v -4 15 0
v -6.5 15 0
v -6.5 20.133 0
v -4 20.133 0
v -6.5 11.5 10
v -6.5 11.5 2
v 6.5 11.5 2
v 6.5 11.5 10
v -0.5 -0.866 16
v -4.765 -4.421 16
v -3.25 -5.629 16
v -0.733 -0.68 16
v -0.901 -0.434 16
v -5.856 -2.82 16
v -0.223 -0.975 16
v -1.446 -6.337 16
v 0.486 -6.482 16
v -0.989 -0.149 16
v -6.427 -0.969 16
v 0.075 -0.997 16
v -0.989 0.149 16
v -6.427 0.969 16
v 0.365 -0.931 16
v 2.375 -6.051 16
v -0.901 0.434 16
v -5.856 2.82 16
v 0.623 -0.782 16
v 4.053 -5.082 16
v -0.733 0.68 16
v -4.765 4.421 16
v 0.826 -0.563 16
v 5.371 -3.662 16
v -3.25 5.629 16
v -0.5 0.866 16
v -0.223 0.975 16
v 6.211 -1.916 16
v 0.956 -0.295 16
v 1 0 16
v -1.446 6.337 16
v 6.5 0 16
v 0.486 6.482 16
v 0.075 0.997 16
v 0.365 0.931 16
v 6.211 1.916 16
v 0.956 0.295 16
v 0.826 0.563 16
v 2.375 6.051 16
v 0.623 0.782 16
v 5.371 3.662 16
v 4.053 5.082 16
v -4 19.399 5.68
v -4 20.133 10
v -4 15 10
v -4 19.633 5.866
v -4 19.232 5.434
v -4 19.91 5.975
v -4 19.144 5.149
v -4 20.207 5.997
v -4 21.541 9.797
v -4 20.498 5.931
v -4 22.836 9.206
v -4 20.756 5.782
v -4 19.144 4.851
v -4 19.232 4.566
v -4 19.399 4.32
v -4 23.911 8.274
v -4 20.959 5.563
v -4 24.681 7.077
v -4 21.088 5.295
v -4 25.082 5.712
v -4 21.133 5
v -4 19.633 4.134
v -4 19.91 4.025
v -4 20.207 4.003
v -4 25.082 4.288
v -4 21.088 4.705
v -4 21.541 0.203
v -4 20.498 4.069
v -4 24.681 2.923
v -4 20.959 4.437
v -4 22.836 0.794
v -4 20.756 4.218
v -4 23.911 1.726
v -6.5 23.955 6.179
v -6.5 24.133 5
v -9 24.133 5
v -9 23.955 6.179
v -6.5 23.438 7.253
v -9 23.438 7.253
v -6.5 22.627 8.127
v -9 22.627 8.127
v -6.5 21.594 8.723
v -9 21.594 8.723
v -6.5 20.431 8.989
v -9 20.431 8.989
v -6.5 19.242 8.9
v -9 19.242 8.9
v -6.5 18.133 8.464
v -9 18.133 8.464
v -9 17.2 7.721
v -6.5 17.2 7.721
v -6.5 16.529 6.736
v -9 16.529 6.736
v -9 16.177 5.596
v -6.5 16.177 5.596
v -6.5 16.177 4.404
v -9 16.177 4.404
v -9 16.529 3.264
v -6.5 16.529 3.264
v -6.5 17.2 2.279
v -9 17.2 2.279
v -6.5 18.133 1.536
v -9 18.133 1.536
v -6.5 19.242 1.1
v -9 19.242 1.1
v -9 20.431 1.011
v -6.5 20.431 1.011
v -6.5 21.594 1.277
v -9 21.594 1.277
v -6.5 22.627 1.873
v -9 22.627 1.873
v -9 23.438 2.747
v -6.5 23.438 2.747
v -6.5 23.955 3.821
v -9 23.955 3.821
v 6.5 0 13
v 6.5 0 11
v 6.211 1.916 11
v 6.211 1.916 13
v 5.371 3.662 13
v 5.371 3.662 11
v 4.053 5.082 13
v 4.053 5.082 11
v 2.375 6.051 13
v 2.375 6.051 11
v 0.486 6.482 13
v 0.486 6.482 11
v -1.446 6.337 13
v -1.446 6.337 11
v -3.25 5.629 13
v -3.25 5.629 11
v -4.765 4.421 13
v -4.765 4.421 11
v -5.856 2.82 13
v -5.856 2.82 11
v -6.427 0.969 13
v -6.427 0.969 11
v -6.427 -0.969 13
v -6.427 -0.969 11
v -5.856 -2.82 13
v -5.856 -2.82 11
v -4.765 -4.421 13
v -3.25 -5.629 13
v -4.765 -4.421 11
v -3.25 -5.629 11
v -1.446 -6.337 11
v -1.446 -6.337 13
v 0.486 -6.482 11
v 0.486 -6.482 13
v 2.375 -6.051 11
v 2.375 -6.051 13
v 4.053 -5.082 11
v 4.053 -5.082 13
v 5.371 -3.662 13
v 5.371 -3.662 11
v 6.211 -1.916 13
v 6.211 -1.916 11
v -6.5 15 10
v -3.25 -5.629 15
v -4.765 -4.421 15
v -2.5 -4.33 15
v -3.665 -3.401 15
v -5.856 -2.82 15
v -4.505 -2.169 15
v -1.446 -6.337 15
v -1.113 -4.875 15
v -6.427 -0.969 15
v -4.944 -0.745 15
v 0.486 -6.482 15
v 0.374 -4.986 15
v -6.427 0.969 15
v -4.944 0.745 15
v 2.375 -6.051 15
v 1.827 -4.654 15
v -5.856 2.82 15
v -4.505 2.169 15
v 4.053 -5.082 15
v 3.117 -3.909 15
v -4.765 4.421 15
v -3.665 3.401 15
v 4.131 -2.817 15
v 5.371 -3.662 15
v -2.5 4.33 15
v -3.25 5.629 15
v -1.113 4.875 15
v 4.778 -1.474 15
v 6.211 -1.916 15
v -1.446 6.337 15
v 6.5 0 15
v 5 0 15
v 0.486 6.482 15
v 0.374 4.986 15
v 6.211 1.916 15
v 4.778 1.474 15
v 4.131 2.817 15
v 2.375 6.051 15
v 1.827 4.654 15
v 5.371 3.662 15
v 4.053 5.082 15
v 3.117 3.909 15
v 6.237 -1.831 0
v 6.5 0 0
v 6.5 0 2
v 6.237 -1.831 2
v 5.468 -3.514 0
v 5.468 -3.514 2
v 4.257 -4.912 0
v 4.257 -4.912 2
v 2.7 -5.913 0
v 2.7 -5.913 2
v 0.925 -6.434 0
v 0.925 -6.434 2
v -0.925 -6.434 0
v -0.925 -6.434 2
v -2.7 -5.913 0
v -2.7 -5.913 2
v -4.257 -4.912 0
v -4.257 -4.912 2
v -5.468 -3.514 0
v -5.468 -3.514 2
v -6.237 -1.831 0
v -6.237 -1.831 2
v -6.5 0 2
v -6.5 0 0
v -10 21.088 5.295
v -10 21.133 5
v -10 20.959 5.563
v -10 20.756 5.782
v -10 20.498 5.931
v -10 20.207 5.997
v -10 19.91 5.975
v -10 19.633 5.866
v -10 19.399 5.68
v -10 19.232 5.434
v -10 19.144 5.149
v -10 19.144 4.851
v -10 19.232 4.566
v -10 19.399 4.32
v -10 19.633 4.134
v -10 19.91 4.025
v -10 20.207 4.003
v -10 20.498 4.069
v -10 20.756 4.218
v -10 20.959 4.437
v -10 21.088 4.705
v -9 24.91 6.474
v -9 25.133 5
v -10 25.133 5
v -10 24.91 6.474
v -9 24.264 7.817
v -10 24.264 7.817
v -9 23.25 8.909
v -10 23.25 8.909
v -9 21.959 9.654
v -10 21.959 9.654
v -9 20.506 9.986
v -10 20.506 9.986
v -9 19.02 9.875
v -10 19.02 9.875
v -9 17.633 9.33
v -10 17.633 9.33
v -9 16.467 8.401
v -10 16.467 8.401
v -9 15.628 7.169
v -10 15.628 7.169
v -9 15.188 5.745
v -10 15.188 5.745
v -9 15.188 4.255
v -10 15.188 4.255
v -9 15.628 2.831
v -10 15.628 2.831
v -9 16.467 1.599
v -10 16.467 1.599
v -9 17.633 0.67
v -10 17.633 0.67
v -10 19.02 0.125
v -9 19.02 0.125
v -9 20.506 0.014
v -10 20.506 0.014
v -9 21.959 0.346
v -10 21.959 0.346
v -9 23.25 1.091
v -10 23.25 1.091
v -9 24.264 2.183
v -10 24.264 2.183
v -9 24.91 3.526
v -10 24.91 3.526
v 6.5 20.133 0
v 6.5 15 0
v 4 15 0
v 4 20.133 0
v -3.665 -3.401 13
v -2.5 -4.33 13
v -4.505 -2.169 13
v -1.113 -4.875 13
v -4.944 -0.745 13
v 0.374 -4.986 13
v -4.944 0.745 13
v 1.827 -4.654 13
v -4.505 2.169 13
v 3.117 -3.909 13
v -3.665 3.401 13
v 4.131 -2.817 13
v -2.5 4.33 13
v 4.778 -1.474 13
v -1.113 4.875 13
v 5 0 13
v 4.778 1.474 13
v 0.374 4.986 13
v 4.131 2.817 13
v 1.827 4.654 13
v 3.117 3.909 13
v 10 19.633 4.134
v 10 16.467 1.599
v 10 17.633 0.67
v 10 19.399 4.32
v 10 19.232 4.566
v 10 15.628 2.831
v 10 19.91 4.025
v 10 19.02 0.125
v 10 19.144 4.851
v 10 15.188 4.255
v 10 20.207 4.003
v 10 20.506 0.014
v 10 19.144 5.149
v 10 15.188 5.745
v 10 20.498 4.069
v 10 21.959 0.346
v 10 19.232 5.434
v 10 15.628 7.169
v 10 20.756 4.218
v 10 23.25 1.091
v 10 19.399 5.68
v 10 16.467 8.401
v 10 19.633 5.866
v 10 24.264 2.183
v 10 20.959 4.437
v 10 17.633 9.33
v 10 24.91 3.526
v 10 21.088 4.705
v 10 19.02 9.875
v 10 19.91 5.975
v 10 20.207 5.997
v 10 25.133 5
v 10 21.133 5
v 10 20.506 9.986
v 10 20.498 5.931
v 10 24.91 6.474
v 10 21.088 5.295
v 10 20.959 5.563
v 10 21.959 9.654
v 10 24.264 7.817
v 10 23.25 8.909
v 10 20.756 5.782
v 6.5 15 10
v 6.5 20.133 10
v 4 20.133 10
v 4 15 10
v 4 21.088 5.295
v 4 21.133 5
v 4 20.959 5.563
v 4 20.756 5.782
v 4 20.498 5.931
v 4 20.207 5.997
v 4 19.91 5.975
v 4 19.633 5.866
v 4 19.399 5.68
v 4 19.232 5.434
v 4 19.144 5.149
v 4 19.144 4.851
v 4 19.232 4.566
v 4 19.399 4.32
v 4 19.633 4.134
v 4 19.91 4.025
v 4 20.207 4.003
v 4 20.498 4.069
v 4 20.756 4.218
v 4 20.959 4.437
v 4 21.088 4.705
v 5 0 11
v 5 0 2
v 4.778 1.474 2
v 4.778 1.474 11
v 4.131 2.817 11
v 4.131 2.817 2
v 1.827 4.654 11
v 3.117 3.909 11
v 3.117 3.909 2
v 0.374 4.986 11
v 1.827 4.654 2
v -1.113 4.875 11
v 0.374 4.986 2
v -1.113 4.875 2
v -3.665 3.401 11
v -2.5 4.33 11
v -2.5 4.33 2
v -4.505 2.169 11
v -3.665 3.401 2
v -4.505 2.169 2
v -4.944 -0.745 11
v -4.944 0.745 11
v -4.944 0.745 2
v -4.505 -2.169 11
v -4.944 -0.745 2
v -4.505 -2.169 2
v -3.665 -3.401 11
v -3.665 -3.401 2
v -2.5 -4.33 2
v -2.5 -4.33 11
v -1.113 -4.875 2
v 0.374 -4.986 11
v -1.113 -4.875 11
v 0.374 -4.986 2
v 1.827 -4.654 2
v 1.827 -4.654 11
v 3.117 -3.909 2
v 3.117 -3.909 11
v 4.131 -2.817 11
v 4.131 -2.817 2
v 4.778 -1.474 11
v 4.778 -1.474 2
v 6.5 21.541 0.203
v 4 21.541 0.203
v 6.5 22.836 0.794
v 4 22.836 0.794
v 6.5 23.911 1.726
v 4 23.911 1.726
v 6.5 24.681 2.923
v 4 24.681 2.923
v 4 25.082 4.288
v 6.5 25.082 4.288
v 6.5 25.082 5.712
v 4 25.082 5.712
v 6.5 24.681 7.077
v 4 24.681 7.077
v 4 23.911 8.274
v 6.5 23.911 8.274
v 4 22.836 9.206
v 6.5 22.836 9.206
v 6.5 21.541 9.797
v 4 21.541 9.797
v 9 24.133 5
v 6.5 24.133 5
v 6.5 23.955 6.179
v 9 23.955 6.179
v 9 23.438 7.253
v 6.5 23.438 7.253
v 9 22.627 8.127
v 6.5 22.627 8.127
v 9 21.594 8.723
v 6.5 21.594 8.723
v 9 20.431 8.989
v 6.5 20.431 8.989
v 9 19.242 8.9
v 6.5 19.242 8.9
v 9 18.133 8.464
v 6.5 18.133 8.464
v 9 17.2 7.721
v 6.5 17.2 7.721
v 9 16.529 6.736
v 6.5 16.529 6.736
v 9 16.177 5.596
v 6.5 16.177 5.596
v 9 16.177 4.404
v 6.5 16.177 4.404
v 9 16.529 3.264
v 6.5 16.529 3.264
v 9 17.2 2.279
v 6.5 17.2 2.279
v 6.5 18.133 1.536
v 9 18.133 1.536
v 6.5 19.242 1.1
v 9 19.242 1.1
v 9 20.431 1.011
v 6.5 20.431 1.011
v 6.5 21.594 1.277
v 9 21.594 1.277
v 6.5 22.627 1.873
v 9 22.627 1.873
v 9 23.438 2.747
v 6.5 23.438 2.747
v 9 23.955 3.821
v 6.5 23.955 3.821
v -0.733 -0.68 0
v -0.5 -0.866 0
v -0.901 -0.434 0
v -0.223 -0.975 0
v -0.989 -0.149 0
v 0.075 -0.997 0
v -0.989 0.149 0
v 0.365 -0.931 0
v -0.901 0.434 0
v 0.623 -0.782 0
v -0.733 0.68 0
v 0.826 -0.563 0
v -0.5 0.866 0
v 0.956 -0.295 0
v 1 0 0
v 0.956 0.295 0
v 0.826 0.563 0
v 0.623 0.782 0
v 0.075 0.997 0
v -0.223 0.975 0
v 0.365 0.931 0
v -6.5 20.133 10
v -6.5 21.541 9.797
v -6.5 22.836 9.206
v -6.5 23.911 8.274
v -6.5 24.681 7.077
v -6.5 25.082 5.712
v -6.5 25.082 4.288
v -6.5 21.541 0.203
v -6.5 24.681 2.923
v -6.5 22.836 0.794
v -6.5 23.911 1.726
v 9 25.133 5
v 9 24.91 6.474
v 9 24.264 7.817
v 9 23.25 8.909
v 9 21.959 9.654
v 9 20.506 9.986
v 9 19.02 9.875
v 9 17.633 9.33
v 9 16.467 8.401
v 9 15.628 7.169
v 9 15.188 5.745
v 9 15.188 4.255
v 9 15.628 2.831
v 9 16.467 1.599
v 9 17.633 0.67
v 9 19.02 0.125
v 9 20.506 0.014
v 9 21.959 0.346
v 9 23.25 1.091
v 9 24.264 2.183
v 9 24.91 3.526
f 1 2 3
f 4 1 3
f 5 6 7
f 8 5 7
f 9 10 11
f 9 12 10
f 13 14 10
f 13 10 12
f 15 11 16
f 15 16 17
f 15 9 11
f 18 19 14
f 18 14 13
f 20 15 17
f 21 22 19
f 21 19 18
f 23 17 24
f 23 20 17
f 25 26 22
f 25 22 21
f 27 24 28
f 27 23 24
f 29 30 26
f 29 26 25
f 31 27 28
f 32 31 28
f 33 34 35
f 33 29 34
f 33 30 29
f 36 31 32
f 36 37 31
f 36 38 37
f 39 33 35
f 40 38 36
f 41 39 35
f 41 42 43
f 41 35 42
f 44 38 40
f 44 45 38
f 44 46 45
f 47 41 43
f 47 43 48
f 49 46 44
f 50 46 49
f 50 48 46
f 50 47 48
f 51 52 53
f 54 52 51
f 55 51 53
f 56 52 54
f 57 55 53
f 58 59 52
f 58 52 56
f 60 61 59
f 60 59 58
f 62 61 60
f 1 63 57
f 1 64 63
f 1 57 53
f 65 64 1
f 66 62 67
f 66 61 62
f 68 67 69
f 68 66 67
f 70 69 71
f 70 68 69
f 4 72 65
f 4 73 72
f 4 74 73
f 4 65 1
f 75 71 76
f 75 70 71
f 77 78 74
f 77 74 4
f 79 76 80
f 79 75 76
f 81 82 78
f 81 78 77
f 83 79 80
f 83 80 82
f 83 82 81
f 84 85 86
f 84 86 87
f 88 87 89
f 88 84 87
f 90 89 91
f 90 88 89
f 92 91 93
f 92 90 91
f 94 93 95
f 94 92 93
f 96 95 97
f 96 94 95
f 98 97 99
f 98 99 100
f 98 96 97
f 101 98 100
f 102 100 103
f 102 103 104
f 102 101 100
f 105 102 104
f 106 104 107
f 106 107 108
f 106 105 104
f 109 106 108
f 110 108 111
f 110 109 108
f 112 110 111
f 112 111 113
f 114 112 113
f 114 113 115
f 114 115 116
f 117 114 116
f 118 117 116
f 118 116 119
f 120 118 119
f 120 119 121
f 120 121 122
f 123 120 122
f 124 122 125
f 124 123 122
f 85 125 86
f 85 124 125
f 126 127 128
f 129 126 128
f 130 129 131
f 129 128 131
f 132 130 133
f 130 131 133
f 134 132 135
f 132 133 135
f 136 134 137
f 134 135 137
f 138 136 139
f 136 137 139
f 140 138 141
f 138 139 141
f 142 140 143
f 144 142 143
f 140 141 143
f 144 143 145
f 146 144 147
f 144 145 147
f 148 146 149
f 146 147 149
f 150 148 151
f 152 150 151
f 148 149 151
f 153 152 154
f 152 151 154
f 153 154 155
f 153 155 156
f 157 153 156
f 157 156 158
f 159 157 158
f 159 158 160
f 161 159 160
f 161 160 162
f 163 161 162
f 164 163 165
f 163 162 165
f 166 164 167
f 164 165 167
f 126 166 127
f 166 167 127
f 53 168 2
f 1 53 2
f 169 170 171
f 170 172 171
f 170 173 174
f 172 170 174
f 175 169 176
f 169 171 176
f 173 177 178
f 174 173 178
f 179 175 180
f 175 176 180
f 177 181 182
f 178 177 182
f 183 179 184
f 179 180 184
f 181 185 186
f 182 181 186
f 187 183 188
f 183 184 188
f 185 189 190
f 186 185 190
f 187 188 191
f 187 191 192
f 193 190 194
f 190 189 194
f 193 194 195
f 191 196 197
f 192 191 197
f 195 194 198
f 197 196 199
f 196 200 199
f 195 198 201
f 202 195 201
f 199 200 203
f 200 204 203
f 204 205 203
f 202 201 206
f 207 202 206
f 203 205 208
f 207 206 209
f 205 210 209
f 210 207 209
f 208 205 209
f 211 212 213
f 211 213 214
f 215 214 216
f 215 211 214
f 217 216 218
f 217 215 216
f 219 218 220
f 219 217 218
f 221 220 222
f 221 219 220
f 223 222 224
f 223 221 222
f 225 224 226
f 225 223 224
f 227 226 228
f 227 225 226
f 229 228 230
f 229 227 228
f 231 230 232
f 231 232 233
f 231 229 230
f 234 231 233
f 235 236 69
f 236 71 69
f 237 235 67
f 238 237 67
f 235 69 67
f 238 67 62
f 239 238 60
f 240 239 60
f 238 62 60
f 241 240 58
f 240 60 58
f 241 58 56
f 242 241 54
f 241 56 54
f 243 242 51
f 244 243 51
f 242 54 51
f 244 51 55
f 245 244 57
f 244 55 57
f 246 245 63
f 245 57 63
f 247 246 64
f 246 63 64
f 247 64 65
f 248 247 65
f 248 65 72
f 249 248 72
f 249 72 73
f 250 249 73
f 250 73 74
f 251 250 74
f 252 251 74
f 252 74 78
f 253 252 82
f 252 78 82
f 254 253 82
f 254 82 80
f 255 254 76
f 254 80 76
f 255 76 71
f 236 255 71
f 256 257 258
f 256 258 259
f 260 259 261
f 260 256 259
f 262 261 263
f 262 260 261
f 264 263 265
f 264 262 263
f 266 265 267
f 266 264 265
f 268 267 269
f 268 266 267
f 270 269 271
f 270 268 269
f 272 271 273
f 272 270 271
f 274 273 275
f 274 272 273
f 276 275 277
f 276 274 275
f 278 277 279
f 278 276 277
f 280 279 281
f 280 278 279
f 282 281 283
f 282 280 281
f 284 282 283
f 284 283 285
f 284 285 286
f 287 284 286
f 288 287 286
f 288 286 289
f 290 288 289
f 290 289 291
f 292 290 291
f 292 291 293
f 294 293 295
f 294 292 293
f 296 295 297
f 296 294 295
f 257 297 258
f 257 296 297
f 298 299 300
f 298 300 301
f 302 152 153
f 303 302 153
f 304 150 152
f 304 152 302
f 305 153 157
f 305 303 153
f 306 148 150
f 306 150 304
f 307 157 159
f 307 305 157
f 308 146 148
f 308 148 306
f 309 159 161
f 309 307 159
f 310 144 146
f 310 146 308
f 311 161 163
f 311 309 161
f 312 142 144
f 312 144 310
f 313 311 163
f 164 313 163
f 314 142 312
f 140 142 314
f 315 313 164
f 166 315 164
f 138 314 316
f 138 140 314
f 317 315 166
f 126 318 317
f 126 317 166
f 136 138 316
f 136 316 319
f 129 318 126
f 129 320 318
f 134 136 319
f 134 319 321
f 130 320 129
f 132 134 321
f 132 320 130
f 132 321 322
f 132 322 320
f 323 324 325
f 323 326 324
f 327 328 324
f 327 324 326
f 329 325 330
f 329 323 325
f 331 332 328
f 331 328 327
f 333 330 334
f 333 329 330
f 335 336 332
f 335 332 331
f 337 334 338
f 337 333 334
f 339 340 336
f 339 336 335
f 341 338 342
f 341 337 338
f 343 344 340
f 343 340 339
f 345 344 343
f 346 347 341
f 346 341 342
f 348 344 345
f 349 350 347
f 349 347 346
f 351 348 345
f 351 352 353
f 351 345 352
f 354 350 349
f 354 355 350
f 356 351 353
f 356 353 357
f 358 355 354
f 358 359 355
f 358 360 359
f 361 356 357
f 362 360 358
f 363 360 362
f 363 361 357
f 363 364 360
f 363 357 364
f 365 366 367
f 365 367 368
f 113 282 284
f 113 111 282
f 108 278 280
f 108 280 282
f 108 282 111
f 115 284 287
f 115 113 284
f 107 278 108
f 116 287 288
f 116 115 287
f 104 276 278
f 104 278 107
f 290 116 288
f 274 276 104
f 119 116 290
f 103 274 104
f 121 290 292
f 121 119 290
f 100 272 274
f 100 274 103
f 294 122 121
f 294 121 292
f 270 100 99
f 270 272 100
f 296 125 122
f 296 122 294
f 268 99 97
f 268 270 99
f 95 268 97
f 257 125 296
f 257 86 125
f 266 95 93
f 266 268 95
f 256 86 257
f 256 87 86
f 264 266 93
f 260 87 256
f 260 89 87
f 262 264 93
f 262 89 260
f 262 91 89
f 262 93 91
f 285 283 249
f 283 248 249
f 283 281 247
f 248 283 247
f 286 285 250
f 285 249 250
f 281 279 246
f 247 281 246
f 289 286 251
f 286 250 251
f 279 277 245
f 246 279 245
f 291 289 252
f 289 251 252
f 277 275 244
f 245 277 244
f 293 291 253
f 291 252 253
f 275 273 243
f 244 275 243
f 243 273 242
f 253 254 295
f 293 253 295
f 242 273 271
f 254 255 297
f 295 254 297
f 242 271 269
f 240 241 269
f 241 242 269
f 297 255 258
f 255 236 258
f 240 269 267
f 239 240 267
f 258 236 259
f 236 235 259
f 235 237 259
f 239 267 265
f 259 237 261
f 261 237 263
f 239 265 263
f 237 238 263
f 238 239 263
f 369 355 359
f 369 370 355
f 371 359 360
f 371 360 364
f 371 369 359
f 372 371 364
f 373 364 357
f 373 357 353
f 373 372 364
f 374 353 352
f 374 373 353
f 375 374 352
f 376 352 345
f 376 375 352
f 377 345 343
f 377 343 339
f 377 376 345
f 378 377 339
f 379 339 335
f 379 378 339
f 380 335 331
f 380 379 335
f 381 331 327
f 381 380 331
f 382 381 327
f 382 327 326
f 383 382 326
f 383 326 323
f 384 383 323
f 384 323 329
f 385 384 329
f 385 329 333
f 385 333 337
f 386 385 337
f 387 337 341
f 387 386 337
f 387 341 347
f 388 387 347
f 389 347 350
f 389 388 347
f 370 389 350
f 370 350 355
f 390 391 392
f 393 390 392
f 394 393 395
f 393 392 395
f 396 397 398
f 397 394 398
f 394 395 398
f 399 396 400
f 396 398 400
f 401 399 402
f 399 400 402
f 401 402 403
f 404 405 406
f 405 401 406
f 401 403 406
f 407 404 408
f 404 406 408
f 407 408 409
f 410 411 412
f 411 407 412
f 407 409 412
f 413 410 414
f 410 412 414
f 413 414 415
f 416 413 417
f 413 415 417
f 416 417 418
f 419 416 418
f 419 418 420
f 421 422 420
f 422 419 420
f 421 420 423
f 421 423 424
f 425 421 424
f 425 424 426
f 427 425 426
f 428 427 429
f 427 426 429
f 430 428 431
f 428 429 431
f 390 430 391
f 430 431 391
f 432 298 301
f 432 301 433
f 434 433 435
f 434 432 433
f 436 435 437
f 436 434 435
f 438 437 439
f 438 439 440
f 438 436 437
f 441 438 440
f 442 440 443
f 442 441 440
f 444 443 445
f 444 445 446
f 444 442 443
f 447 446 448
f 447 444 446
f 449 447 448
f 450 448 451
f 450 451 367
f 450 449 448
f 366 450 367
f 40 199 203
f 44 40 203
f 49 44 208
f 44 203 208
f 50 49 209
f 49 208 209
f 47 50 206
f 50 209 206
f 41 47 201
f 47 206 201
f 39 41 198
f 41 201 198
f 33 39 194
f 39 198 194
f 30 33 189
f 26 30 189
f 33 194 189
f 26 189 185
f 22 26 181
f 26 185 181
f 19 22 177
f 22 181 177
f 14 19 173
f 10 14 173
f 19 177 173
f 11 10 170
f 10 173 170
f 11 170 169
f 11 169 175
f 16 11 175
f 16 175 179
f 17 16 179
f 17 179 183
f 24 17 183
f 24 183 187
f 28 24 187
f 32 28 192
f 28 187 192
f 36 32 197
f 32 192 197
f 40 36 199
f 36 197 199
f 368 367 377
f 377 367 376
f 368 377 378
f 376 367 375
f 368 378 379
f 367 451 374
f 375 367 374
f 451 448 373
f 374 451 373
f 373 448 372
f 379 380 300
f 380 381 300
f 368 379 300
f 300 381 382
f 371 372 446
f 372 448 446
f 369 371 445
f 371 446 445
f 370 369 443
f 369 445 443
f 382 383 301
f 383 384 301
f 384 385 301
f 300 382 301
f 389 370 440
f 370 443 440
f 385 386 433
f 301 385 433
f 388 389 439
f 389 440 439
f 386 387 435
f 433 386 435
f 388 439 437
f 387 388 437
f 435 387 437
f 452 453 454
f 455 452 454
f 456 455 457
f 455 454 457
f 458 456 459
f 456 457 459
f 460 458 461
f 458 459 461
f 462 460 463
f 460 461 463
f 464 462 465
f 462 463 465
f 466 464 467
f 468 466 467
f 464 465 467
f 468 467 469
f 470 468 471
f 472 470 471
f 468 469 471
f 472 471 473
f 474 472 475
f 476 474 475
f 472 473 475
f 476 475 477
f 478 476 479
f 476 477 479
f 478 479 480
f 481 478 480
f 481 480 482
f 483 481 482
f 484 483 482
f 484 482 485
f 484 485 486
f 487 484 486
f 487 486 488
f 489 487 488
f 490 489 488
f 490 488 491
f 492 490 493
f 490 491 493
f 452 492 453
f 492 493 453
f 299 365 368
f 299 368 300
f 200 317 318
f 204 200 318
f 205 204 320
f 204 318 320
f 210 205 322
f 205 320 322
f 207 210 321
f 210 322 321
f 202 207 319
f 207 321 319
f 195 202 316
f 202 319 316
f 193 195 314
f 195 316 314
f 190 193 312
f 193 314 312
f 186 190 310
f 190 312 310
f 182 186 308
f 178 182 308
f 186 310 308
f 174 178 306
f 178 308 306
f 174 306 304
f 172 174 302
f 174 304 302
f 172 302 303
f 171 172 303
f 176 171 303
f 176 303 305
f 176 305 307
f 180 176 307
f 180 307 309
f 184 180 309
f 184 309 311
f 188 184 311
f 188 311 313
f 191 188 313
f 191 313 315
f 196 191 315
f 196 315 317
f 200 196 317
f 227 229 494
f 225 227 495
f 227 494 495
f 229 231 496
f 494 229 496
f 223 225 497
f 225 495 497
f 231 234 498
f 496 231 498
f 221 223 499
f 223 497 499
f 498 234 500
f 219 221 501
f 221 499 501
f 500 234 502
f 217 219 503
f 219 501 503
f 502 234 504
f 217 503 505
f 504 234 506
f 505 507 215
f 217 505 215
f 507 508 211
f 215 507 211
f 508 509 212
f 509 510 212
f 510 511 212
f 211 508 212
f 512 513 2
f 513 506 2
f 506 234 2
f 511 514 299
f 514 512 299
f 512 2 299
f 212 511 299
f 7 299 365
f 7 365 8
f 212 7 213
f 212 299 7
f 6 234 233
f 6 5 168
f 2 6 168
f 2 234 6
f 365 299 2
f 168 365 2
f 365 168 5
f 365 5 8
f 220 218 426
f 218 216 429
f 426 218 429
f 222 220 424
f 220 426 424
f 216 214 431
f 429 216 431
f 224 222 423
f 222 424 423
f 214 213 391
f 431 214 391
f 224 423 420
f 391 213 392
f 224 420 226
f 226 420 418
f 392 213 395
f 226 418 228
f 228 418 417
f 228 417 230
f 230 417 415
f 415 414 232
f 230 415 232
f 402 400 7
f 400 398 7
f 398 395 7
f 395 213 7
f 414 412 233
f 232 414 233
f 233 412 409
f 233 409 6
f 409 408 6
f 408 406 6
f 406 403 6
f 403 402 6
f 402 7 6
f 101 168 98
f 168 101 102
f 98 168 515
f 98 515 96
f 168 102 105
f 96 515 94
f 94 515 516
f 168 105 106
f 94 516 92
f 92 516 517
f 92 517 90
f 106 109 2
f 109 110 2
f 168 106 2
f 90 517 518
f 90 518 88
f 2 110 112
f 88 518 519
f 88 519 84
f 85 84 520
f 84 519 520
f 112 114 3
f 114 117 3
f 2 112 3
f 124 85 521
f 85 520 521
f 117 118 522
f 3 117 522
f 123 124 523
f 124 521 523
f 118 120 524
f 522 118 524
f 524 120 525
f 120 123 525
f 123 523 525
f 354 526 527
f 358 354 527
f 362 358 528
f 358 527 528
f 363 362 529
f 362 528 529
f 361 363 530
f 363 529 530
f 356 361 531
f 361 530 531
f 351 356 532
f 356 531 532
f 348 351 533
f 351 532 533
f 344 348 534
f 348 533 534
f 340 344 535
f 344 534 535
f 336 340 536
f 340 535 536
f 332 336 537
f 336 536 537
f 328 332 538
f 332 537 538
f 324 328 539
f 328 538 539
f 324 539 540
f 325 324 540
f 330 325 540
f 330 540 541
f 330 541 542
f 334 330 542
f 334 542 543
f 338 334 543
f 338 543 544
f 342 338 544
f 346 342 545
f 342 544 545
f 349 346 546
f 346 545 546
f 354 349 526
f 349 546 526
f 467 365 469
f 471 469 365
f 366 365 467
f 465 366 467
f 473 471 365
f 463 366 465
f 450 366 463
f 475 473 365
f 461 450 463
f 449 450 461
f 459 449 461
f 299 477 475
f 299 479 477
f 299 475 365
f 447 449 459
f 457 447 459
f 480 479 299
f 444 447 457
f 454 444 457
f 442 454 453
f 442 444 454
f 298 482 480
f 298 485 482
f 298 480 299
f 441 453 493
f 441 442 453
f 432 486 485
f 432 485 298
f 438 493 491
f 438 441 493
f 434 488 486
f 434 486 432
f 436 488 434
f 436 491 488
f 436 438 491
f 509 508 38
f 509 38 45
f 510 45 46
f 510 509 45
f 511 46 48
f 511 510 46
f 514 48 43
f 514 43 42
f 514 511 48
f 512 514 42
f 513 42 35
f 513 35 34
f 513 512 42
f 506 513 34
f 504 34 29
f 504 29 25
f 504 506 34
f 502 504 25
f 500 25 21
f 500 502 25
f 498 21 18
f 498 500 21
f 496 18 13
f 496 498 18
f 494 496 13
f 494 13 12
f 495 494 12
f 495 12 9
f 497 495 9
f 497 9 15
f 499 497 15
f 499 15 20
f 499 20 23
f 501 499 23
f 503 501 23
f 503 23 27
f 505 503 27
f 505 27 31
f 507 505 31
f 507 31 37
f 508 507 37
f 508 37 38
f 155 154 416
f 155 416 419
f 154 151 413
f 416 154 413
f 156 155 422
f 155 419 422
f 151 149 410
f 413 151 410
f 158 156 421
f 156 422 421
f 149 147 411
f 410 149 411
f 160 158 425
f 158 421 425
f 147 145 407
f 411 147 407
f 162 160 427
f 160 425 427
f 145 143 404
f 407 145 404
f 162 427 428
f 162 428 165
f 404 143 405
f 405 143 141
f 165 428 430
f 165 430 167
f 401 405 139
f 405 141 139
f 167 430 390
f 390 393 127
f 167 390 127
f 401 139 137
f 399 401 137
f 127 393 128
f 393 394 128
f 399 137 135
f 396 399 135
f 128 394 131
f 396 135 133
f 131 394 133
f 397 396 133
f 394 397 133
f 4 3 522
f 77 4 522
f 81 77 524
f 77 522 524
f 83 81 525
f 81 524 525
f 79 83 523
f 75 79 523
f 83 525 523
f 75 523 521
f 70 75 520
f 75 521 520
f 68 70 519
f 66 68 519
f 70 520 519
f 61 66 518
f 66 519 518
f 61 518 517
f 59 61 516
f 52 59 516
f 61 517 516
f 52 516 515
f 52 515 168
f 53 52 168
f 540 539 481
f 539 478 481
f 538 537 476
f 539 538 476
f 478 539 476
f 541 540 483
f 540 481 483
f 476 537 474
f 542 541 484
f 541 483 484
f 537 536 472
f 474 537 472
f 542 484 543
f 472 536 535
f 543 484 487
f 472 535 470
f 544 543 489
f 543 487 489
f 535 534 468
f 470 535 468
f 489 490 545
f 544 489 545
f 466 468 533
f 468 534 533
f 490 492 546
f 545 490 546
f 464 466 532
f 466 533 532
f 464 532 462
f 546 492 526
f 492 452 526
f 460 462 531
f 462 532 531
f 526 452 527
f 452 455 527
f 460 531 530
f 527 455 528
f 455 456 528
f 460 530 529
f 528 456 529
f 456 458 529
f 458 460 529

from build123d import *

# Parameters (mm, degrees)
SKETCH4_R            = 5
SKETCH4_R_2          = 1
BOSS_EXTRUDE5_DEPTH  = 15
BOSS_EXTRUDE7_START  = -4
SKETCH5_R            = 6.5
SKETCH5_R_2          = 1
BOSS_EXTRUDE7_DEPTH  = 2
SKETCH7_R            = 6.5
SKETCH7_R_2          = 1
BOSS_EXTRUDE8_DEPTH  = 1
SKETCH8_R            = 1
BOSS_EXTRUDE9_DEPTH  = 2
BOSS_EXTRUDE10_DEPTH = 10
SKETCH10_R           = 1
BOSS_EXTRUDE11_DEPTH = 2.5
SKETCH11_R           = 4
SKETCH11_R_2         = 1
BOSS_EXTRUDE12_DEPTH = 2.5
SKETCH12_R           = 5
SKETCH12_R_2         = 1
BOSS_EXTRUDE13_DEPTH = 1


with BuildPart() as part:
    # Sketch4 → Boss-Extrude5 (new body)
    with BuildSketch(Plane.XY):
        Circle(SKETCH4_R)
        Circle(SKETCH4_R_2, mode=Mode.SUBTRACT)
    extrude(amount=BOSS_EXTRUDE5_DEPTH)

    # Sketch5 → Boss-Extrude7 (add)
    with BuildSketch(Plane.XY.offset(15).offset(BOSS_EXTRUDE7_START)):
        Circle(SKETCH5_R)
        Circle(SKETCH5_R_2, mode=Mode.SUBTRACT)
    extrude(amount=BOSS_EXTRUDE7_DEPTH)

    # Sketch7 → Boss-Extrude8 (add)
    with BuildSketch(Plane.XY.offset(15)):
        Circle(SKETCH7_R)
        Circle(SKETCH7_R_2, mode=Mode.SUBTRACT)
    extrude(amount=BOSS_EXTRUDE8_DEPTH)

    # Sketch8 → Boss-Extrude9 (add)
    with BuildSketch(Plane(origin=(0, 0, 0), x_dir=(-1, 0, 0), z_dir=(0, 0, -1))):
        with BuildLine():
            Line((6.5, 0), (6.5, 13))
            Line((6.5, 13), (-6.5, 13))
            Line((-6.5, 13), (-6.5, 0))
            ThreePointArc((-6.5, 0), (0, -6.5), (6.5, 0))
        make_face()
        with Locations(Location((0, 0, 0), (0, 0, 180))):
            Circle(SKETCH8_R, mode=Mode.SUBTRACT)
    extrude(amount=-BOSS_EXTRUDE9_DEPTH)

    # Sketch9 → Boss-Extrude10 (add)
    with BuildSketch(Plane(origin=(0, 0, 0), x_dir=(-1, 0, 0), z_dir=(0, 0, -1))):
        Polygon((-6.5, 13), (-6.5, 15), (6.5, 15), (6.5, 13), (6.5, 11.5), (-6.5, 11.5), align=None)
    extrude(amount=-BOSS_EXTRUDE10_DEPTH)


with BuildPart() as body_2:
    # Sketch10 → Boss-Extrude11 (new body)
    with BuildSketch(Plane(origin=(6.5, 0, 0), x_dir=(0, 0, -1), z_dir=(1, 0, 0))):
        with BuildLine():
            Line((-10, 20.132551776), (-10, 15))
            Line((-10, 15), (0, 15))
            Line((0, 15), (0, 20.132551776))
            ThreePointArc((0, 20.132551776), (-5, 25.132551776), (-10, 20.132551776))
        make_face()
        with Locations(Location((-5, 20.132551776, 0), (0, 0, 90))):
            Circle(SKETCH10_R, mode=Mode.SUBTRACT)
    extrude(amount=-BOSS_EXTRUDE11_DEPTH)

    # Sketch11 → Boss-Extrude12 (add)
    with BuildSketch(Plane(origin=(6.5, 0, 0), x_dir=(0, 0, -1), z_dir=(1, 0, 0))):
        with Locations(Location((-5, 20.132551776, 0), (0, 0, 90))):
            Circle(SKETCH11_R)
        with Locations(Location((-5, 20.132551776, 0), (0, 0, 90))):
            Circle(SKETCH11_R_2, mode=Mode.SUBTRACT)
    extrude(amount=BOSS_EXTRUDE12_DEPTH)

    # Sketch12 → Boss-Extrude13 (add)
    with BuildSketch(Plane(origin=(9, 0, 0), x_dir=(0, 0, -1), z_dir=(1, 0, 0))):
        with Locations(Location((-5, 20.132551776, 0), (0, 0, 90))):
            Circle(SKETCH12_R)
        with Locations(Location((-5, 20.132551776, 0), (0, 0, 90))):
            Circle(SKETCH12_R_2, mode=Mode.SUBTRACT)
    extrude(amount=BOSS_EXTRUDE13_DEPTH)


with BuildPart() as body_3:
    # Mirror4: mirrored copy
    add(body_2.part.mirror(Plane(origin=(0, 0, 0), x_dir=(0, 0, 1), z_dir=(1, 0, 0))))


solid = Compound([part.part, body_2.part, body_3.part])
